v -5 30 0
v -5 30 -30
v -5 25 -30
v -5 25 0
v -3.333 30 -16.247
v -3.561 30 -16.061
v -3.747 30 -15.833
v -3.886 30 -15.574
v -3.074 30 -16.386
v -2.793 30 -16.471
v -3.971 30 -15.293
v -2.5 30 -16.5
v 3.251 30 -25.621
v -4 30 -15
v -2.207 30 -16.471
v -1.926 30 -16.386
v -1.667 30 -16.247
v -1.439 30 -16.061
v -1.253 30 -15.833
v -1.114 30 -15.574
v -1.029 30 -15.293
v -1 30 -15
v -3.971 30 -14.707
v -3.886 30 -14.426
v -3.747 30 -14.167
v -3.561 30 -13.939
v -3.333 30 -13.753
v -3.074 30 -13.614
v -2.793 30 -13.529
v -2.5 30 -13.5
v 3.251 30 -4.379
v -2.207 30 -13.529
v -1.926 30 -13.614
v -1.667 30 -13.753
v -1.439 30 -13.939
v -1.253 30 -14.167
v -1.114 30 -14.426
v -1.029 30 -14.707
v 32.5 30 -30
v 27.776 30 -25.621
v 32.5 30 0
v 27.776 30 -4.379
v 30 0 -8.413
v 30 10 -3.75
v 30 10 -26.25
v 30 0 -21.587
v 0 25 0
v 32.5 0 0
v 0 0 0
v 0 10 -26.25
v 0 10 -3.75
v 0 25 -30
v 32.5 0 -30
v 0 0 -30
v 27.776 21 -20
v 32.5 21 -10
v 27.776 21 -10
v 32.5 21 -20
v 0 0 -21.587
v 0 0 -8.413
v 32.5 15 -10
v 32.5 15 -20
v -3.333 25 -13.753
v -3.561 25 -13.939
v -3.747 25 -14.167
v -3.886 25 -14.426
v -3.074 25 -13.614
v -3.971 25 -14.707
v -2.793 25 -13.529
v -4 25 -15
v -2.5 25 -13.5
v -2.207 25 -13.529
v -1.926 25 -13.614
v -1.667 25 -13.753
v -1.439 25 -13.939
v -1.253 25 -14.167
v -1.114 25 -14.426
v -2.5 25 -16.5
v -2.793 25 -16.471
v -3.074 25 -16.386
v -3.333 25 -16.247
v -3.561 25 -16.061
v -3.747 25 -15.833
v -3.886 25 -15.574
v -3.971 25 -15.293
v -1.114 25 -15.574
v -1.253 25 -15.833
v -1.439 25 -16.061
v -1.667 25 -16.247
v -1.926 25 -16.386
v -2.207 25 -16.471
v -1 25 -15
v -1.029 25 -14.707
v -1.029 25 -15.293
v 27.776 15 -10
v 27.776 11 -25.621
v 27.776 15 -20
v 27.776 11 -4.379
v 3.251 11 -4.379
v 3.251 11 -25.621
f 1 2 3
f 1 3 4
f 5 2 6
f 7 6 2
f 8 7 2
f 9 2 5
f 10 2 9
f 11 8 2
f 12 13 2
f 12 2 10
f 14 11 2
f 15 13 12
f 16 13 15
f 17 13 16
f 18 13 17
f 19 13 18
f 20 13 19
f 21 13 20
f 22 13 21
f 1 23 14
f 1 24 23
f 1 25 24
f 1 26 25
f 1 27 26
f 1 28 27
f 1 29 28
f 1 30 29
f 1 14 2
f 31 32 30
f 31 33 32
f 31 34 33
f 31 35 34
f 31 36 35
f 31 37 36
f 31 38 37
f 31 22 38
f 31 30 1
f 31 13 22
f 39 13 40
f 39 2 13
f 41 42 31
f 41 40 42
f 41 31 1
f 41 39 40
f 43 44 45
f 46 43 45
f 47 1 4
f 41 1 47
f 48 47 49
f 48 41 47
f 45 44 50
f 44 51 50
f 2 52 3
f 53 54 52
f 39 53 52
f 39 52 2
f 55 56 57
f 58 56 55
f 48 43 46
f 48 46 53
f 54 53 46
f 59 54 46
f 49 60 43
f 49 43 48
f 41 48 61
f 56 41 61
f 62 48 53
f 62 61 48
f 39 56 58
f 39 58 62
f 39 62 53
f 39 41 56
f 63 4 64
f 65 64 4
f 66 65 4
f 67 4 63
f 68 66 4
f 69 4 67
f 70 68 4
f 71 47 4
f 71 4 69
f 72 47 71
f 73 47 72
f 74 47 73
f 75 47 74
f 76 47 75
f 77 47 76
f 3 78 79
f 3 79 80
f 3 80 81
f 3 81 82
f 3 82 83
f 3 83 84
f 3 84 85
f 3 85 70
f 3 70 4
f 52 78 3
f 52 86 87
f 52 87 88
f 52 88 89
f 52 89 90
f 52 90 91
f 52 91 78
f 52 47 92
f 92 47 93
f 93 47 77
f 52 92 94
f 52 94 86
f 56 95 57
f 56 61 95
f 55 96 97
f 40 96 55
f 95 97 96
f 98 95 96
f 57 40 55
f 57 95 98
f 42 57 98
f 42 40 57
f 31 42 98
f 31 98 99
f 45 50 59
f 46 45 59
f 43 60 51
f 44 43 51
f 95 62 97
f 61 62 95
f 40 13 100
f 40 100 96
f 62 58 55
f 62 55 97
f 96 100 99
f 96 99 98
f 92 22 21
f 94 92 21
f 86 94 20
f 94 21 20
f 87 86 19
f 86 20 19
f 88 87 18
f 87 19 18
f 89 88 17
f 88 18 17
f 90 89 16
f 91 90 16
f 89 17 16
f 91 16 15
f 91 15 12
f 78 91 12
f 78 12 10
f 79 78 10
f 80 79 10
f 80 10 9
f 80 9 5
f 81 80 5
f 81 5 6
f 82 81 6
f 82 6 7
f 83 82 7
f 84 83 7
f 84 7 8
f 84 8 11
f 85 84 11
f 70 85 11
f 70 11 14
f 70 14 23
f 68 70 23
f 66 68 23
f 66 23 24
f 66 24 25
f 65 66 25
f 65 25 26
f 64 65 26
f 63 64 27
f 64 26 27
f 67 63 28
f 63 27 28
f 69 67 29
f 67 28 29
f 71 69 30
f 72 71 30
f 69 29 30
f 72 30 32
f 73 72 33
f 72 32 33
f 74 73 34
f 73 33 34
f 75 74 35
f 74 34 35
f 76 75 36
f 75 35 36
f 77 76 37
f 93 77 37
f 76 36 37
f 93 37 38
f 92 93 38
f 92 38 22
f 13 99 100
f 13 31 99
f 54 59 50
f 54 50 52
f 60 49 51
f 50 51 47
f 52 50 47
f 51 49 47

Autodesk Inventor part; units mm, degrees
ref_plane "YZ Plane" through (0, 0, 0) normal (1, 0, 0) x (0, 1, 0)
ref_plane "XZ Plane" through (0, 0, 0) normal (0, 1, 0) x (-1, 0, 0)
ref_plane "XY Plane" through (0, 0, 0) normal (0, 0, 1) x (1, 0, 0)
sketch "Sketch1" plane through (0, 0, 0) normal (1, 0, 0) x (0, 1, 0)
  line L0 (0, 0) -> (30, 0)
  line L1 (30, 0) -> (30, -30)
  line L2 (30, -30) -> (0, -30)
  line L3 (0, -30) -> (0, 0)
  line L4 (0, -8.4131) -> (10, -3.75)
  line L5 (10, -3.75) -> (10, -26.25)
  line L6 (10, -26.25) -> (0, -21.5869)
  point P0 (10, -15)
  point P1 (0, -15)
  dimension "d0" = 30
  dimension "d1" = 30
  dimension "d2" = 10
  dimension "d3" = 22.5
  dimension "d4" = 65
  dimension "d5" = 65
extrude "Extrusion1" add sketch "Sketch1" along normal blind 30 contours L0 L1 L2 L3 L6 L5 L4
sketch "Sketch2" plane through (30, 0, 0) normal (1, 0, 0) x (0, 0, -1)
  line L0 (0, 30) -> (0, 0) projected
  line L1 (21.5869, 0) -> (30, 0) projected
  line L2 (0, 30) -> (30, 30)
  line L3 (30, 30) -> (30, 0)
  line L4 (30, 0) -> (0, 0)
  line L5 (0, 0) -> (0, 30)
  point P0 (21.5869, 0)
extrude "Extrusion2" add sketch "Sketch2" along normal blind 2.5
sketch "Sketch3" plane through (0, 0, 0) normal (-1, 0, 0) x (0, 0, 1)
  line L0 (-30, 0) -> (-30, 30) projected
  line L1 (0, 30) -> (0, 0) projected
  line L2 (-30, 30) -> (0, 30)
  line L3 (0, 30) -> (0, 25)
  line L4 (0, 25) -> (-30, 25)
  line L5 (-30, 25) -> (-30, 30)
  point P0 (0, 30)
  dimension "d10" = 5
extrude "Extrusion3" add sketch "Sketch3" along normal blind 5
sketch "Sketch4" plane through (32.5, 30, 0) normal (0, 1, 0) x (1, 0, 0)
  line L0 (-32.5, 0) -> (-37.5, 0) projected
  line L1 (-32.5, 0) -> (-32.5, 30) construction
  circle A0 centre (-35, 15) radius 1.5
  dimension "d13" = 3
extrude "Extrusion4" cut sketch "Sketch4" against normal through all
sketch "Sketch5" plane through (32.5, 30, 0) normal (0, 1, 0) x (1, 0, 0)
  line L0 (-29.2486, 25.6211) -> (-4.7242, 25.6211)
  line L1 (-4.7242, 25.6211) -> (-4.7242, 4.3789)
  line L2 (-4.7242, 4.3789) -> (-29.2486, 4.3789)
  line L3 (-29.2486, 4.3789) -> (-29.2486, 25.6211)
  line L4 (0, 30) -> (0, 0) projected
  point P0 (-32.5, 0)
  point P1 (0, 15)
  point P2 (-4.7242, 15)
  point P3 (0, 15)
extrude "Extrusion5" cut sketch "Sketch5" against normal blind 19
sketch "Sketch6" plane through (32.5, 0, 0) normal (1, 0, 0) x (0, 0, -1)
  line L0 (25.6211, 11) -> (4.3789, 11) projected
  line L1 (10, 21) -> (20, 21)
  line L2 (20, 21) -> (20, 15)
  line L3 (20, 15) -> (10, 15)
  line L4 (10, 15) -> (10, 21)
  point P0 (0, 0)
  point P1 (15, 15)
  point P2 (15, 11)
  dimension "d18" = 10
  dimension "d19" = 6
  dimension "d20" = 4
extrude "Extrusion6" cut sketch "Sketch6" against normal up to next
properties part number "Top Sensor Mount"
